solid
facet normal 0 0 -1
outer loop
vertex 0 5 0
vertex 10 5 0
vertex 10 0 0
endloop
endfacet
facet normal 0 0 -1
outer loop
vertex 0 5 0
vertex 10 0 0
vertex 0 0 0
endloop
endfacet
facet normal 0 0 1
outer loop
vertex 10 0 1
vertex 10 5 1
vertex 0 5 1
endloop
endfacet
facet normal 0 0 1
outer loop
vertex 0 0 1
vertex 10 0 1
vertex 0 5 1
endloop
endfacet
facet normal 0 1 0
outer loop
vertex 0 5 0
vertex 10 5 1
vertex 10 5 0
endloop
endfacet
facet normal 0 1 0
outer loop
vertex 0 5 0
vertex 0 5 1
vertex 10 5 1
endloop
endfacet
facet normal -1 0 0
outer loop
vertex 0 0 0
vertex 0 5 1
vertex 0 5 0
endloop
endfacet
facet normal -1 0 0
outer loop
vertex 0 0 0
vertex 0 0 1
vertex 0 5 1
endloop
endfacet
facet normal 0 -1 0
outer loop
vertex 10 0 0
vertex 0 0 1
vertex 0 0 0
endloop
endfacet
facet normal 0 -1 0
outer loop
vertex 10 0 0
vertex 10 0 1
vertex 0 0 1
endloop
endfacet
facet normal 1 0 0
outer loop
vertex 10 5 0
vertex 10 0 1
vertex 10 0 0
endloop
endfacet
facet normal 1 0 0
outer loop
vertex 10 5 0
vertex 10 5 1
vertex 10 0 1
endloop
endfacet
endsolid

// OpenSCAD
x_value = 10;

y_value = 5;

linear_extrude(height = 1) polygon([[0,0],[x_value,0],[x_value,y_value],[0,y_value]],[[0,1,2,3]]);
